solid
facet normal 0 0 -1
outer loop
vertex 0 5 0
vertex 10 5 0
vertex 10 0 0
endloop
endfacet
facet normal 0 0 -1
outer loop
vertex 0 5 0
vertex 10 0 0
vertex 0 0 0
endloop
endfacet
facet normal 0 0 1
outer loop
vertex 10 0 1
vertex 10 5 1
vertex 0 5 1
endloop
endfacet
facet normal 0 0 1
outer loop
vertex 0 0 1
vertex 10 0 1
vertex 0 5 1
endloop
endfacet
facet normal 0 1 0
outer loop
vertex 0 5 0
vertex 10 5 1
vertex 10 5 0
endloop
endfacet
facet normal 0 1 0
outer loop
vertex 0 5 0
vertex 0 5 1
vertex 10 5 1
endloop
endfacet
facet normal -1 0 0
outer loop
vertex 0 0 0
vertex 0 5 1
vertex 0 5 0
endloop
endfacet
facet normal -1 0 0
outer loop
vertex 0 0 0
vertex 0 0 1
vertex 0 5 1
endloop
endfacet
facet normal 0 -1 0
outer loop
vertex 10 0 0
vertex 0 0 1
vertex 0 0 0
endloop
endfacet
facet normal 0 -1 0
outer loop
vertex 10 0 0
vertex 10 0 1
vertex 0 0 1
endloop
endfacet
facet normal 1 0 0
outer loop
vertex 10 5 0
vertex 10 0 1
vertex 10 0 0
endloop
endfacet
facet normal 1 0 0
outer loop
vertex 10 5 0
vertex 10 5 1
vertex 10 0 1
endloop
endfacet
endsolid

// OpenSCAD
x_value = 10;

y_value = 5;

linear_extrude(height = 1) polygon([[0,0],[x_value,0],[x_value,y_value],[0,y_value]],[[0,1,2,3]]);
